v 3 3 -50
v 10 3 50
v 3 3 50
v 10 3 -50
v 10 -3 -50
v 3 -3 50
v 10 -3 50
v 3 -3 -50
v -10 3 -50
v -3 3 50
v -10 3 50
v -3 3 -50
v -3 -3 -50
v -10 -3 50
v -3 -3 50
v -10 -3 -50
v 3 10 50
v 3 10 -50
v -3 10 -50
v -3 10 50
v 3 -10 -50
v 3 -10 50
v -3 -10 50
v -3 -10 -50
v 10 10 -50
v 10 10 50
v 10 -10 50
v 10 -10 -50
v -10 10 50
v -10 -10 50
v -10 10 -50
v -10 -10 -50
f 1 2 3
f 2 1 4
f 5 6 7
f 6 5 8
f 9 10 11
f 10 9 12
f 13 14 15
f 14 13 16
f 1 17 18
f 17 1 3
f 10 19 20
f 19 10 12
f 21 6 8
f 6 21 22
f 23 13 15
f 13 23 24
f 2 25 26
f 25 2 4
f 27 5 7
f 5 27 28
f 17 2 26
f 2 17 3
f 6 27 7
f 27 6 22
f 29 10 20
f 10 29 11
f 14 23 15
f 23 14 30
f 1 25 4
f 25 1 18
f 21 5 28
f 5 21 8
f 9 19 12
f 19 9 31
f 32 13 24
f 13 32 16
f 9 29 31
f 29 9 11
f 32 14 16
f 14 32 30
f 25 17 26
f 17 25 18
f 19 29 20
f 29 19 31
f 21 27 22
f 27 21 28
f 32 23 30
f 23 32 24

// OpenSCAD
// Parameters
cross_section_width_mm = 20; //[10:40:0.5]
cross_section_height_mm = 20; //[10:40:0.5]
length_mm = 100; //[50:200:1]
center = 1; //[0:1:1]
cornerHole = 1; //[0:1:1]
overlap_mm = 1; //[0.5:2:0.1]
outer_corner_radius_mm = 1; //[0:3:0.25]
wall_thickness_mm = 2; //[1:4:0.25]
slot_opening_width_mm = 6; //[4:10:0.25]
slot_depth_mm = 6; //[4:9:0.25]
slot_cavity_width_mm = 10; //[7:14:0.25]
slot_cavity_depth_mm = 3; //[2:6:0.25]
center_bore_diameter_mm = 5; //[3:10:0.25]
corner_hole_diameter_mm = 3; //[0:6:0.25]
corner_hole_inset_mm = 5; //[3:8:0.25]

// Extrusion - complete geometry
module extrusion() {
  color("Silver") {
    difference() {
      // Main body
      cube([cross_section_width_mm, cross_section_height_mm, length_mm], center=true);
      
      // T-slot channels
      union() {
        translate([cross_section_width_mm/2 - (slot_depth_mm + overlap_mm)/2 + overlap_mm/2, 0, 0])
          cube([slot_depth_mm + overlap_mm, slot_opening_width_mm, length_mm + 2*overlap_mm], center=true);
        translate([cross_section_width_mm/2 - slot_depth_mm - (slot_cavity_depth_mm + overlap_mm)/2 + overlap_mm/2, 0, 0])
          cube([slot_cavity_depth_mm + overlap_mm, slot_cavity_width_mm, length_mm + 2*overlap_mm], center=true);
        translate([-(cross_section_width_mm/2 - (slot_depth_mm + overlap_mm)/2 + overlap_mm/2), 0, 0])
          cube([slot_depth_mm + overlap_mm, slot_opening_width_mm, length_mm + 2*overlap_mm], center=true);
        translate([-(cross_section_width_mm/2 - slot_depth_mm - (slot_cavity_depth_mm + overlap_mm)/2 + overlap_mm/2), 0, 0])
          cube([slot_cavity_depth_mm + overlap_mm, slot_cavity_width_mm, length_mm + 2*overlap_mm], center=true);
        translate([0, cross_section_height_mm/2 - (slot_depth_mm + overlap_mm)/2 + overlap_mm/2, 0])
          cube([slot_opening_width_mm, slot_depth_mm + overlap_mm, length_mm + 2*overlap_mm], center=true);
        translate([0, cross_section_height_mm/2 - slot_depth_mm - (slot_cavity_depth_mm + overlap_mm)/2 + overlap_mm/2, 0])
          cube([slot_cavity_width_mm, slot_cavity_depth_mm + overlap_mm, length_mm + 2*overlap_mm], center=true);
        translate([0, -(cross_section_height_mm/2 - (slot_depth_mm + overlap_mm)/2 + overlap_mm/2), 0])
          cube([slot_opening_width_mm, slot_depth_mm + overlap_mm, length_mm + 2*overlap_mm], center=true);
        translate([0, -(cross_section_height_mm/2 - slot_depth_mm - (slot_cavity_depth_mm + overlap_mm)/2 + overlap_mm/2), 0])
          cube([slot_cavity_width_mm, slot_cavity_depth_mm + overlap_mm, length_mm + 2*overlap_mm], center=true);
      }
      
      // Center bore
      translate([0, 0, 0])
        cylinder(r=center_bore_diameter_mm/2, h=length_mm + 2*overlap_mm, center=true);
      
      // Corner holes
      if (cornerHole) {
        union() {
          translate([cross_section_width_mm/2 - corner_hole_inset_mm, cross_section_height_mm/2 - corner_hole_inset_mm, 0])
            cylinder(r=corner_hole_diameter_mm/2, h=length_mm + 2*overlap_mm, center=true);
          translate([-(cross_section_width_mm/2 - corner_hole_inset_mm), cross_section_height_mm/2 - corner_hole_inset_mm, 0])
            cylinder(r=corner_hole_diameter_mm/2, h=length_mm + 2*overlap_mm, center=true);
          translate([-(cross_section_width_mm/2 - corner_hole_inset_mm), -(cross_section_height_mm/2 - corner_hole_inset_mm), 0])
            cylinder(r=corner_hole_diameter_mm/2, h=length_mm + 2*overlap_mm, center=true);
          translate([cross_section_width_mm/2 - corner_hole_inset_mm, -(cross_section_height_mm/2 - corner_hole_inset_mm), 0])
            cylinder(r=corner_hole_diameter_mm/2, h=length_mm + 2*overlap_mm, center=true);
        }
      }
    }
  }
}

// Extrusion Cross Section - complete geometry
module extrusion_cross_section() {
  color("DimGray") {
    difference() {
      // Main body
      cube([cross_section_width_mm, cross_section_height_mm, length_mm], center=true);
      
      // T-slot channels
      union() {
        translate([cross_section_width_mm/2 - (slot_depth_mm + overlap_mm)/2 + overlap_mm/2, 0, 0])
          cube([slot_depth_mm + overlap_mm, slot_opening_width_mm, length_mm + 2*overlap_mm], center=true);
        translate([cross_section_width_mm/2 - slot_depth_mm - (slot_cavity_depth_mm + overlap_mm)/2 + overlap_mm/2, 0, 0])
          cube([slot_cavity_depth_mm + overlap_mm, slot_cavity_width_mm, length_mm + 2*overlap_mm], center=true);
        translate([-(cross_section_width_mm/2 - (slot_depth_mm + overlap_mm)/2 + overlap_mm/2), 0, 0])
          cube([slot_depth_mm + overlap_mm, slot_opening_width_mm, length_mm + 2*overlap_mm], center=true);
        translate([-(cross_section_width_mm/2 - slot_depth_mm - (slot_cavity_depth_mm + overlap_mm)/2 + overlap_mm/2), 0, 0])
          cube([slot_cavity_depth_mm + overlap_mm, slot_cavity_width_mm, length_mm + 2*overlap_mm], center=true);
        translate([0, cross_section_height_mm/2 - (slot_depth_mm + overlap_mm)/2 + overlap_mm/2, 0])
          cube([slot_opening_width_mm, slot_depth_mm + overlap_mm, length_mm + 2*overlap_mm], center=true);
        translate([0, cross_section_height_mm/2 - slot_depth_mm - (slot_cavity_depth_mm + overlap_mm)/2 + overlap_mm/2, 0])
          cube([slot_cavity_width_mm, slot_cavity_depth_mm + overlap_mm, length_mm + 2*overlap_mm], center=true);
        translate([0, -(cross_section_height_mm/2 - (slot_depth_mm + overlap_mm)/2 + overlap_mm/2), 0])
          cube([slot_opening_width_mm, slot_depth_mm + overlap_mm, length_mm + 2*overlap_mm], center=true);
        translate([0, -(cross_section_height_mm/2 - slot_depth_mm - (slot_cavity_depth_mm + overlap_mm)/2 + overlap_mm/2), 0])
          cube([slot_cavity_width_mm, slot_cavity_depth_mm + overlap_mm, length_mm + 2*overlap_mm], center=true);
      }
      
      // Center bore
      translate([0, 0, 0])
        cylinder(r=center_bore_diameter_mm/2, h=length_mm + 2*overlap_mm, center=true);
      
      // Corner holes
      if (cornerHole) {
        union() {
          translate([cross_section_width_mm/2 - corner_hole_inset_mm, cross_section_height_mm/2 - corner_hole_inset_mm, 0])
            cylinder(r=corner_hole_diameter_mm/2, h=length_mm + 2*overlap_mm, center=true);
          translate([-(cross_section_width_mm/2 - corner_hole_inset_mm), cross_section_height_mm/2 - corner_hole_inset_mm, 0])
            cylinder(r=corner_hole_diameter_mm/2, h=length_mm + 2*overlap_mm, center=true);
          translate([-(cross_section_width_mm/2 - corner_hole_inset_mm), -(cross_section_height_mm/2 - corner_hole_inset_mm), 0])
            cylinder(r=corner_hole_diameter_mm/2, h=length_mm + 2*overlap_mm, center=true);
          translate([cross_section_width_mm/2 - corner_hole_inset_mm, -(cross_section_height_mm/2 - corner_hole_inset_mm), 0])
            cylinder(r=corner_hole_diameter_mm/2, h=length_mm + 2*overlap_mm, center=true);
        }
      }
    }
  }
}

// Box Corner Profile Section - complete geometry
module box_corner_profile_section() {
  color("Black") {
    cube([(cross_section_width_mm - slot_opening_width_mm)/2, (cross_section_height_mm - slot_opening_width_mm)/2, length_mm], center=true);
  }
}

// Box Corner Profile Sections - complete geometry
module box_corner_profile_sections() {
  color("Gray") {
    union() {
      translate([cross_section_width_mm/2 - ((cross_section_width_mm - slot_opening_width_mm)/2)/2, cross_section_height_mm/2 - ((cross_section_height_mm - slot_opening_width_mm)/2)/2, 0])
        box_corner_profile_section();
      translate([-(cross_section_width_mm/2 - ((cross_section_width_mm - slot_opening_width_mm)/2)/2), cross_section_height_mm/2 - ((cross_section_height_mm - slot_opening_width_mm)/2)/2, 0])
        box_corner_profile_section();
      translate([cross_section_width_mm/2 - ((cross_section_width_mm - slot_opening_width_mm)/2)/2, -(cross_section_height_mm/2 - ((cross_section_height_mm - slot_opening_width_mm)/2)/2), 0])
        box_corner_profile_section();
      translate([-(cross_section_width_mm/2 - ((cross_section_width_mm - slot_opening_width_mm)/2)/2), -(cross_section_height_mm/2 - ((cross_section_height_mm - slot_opening_width_mm)/2)/2), 0])
        box_corner_profile_section();
    }
  }
}

// Assembly
module assembly() {
  extrusion();
  extrusion_cross_section();
  box_corner_profile_sections();
}

assembly();
